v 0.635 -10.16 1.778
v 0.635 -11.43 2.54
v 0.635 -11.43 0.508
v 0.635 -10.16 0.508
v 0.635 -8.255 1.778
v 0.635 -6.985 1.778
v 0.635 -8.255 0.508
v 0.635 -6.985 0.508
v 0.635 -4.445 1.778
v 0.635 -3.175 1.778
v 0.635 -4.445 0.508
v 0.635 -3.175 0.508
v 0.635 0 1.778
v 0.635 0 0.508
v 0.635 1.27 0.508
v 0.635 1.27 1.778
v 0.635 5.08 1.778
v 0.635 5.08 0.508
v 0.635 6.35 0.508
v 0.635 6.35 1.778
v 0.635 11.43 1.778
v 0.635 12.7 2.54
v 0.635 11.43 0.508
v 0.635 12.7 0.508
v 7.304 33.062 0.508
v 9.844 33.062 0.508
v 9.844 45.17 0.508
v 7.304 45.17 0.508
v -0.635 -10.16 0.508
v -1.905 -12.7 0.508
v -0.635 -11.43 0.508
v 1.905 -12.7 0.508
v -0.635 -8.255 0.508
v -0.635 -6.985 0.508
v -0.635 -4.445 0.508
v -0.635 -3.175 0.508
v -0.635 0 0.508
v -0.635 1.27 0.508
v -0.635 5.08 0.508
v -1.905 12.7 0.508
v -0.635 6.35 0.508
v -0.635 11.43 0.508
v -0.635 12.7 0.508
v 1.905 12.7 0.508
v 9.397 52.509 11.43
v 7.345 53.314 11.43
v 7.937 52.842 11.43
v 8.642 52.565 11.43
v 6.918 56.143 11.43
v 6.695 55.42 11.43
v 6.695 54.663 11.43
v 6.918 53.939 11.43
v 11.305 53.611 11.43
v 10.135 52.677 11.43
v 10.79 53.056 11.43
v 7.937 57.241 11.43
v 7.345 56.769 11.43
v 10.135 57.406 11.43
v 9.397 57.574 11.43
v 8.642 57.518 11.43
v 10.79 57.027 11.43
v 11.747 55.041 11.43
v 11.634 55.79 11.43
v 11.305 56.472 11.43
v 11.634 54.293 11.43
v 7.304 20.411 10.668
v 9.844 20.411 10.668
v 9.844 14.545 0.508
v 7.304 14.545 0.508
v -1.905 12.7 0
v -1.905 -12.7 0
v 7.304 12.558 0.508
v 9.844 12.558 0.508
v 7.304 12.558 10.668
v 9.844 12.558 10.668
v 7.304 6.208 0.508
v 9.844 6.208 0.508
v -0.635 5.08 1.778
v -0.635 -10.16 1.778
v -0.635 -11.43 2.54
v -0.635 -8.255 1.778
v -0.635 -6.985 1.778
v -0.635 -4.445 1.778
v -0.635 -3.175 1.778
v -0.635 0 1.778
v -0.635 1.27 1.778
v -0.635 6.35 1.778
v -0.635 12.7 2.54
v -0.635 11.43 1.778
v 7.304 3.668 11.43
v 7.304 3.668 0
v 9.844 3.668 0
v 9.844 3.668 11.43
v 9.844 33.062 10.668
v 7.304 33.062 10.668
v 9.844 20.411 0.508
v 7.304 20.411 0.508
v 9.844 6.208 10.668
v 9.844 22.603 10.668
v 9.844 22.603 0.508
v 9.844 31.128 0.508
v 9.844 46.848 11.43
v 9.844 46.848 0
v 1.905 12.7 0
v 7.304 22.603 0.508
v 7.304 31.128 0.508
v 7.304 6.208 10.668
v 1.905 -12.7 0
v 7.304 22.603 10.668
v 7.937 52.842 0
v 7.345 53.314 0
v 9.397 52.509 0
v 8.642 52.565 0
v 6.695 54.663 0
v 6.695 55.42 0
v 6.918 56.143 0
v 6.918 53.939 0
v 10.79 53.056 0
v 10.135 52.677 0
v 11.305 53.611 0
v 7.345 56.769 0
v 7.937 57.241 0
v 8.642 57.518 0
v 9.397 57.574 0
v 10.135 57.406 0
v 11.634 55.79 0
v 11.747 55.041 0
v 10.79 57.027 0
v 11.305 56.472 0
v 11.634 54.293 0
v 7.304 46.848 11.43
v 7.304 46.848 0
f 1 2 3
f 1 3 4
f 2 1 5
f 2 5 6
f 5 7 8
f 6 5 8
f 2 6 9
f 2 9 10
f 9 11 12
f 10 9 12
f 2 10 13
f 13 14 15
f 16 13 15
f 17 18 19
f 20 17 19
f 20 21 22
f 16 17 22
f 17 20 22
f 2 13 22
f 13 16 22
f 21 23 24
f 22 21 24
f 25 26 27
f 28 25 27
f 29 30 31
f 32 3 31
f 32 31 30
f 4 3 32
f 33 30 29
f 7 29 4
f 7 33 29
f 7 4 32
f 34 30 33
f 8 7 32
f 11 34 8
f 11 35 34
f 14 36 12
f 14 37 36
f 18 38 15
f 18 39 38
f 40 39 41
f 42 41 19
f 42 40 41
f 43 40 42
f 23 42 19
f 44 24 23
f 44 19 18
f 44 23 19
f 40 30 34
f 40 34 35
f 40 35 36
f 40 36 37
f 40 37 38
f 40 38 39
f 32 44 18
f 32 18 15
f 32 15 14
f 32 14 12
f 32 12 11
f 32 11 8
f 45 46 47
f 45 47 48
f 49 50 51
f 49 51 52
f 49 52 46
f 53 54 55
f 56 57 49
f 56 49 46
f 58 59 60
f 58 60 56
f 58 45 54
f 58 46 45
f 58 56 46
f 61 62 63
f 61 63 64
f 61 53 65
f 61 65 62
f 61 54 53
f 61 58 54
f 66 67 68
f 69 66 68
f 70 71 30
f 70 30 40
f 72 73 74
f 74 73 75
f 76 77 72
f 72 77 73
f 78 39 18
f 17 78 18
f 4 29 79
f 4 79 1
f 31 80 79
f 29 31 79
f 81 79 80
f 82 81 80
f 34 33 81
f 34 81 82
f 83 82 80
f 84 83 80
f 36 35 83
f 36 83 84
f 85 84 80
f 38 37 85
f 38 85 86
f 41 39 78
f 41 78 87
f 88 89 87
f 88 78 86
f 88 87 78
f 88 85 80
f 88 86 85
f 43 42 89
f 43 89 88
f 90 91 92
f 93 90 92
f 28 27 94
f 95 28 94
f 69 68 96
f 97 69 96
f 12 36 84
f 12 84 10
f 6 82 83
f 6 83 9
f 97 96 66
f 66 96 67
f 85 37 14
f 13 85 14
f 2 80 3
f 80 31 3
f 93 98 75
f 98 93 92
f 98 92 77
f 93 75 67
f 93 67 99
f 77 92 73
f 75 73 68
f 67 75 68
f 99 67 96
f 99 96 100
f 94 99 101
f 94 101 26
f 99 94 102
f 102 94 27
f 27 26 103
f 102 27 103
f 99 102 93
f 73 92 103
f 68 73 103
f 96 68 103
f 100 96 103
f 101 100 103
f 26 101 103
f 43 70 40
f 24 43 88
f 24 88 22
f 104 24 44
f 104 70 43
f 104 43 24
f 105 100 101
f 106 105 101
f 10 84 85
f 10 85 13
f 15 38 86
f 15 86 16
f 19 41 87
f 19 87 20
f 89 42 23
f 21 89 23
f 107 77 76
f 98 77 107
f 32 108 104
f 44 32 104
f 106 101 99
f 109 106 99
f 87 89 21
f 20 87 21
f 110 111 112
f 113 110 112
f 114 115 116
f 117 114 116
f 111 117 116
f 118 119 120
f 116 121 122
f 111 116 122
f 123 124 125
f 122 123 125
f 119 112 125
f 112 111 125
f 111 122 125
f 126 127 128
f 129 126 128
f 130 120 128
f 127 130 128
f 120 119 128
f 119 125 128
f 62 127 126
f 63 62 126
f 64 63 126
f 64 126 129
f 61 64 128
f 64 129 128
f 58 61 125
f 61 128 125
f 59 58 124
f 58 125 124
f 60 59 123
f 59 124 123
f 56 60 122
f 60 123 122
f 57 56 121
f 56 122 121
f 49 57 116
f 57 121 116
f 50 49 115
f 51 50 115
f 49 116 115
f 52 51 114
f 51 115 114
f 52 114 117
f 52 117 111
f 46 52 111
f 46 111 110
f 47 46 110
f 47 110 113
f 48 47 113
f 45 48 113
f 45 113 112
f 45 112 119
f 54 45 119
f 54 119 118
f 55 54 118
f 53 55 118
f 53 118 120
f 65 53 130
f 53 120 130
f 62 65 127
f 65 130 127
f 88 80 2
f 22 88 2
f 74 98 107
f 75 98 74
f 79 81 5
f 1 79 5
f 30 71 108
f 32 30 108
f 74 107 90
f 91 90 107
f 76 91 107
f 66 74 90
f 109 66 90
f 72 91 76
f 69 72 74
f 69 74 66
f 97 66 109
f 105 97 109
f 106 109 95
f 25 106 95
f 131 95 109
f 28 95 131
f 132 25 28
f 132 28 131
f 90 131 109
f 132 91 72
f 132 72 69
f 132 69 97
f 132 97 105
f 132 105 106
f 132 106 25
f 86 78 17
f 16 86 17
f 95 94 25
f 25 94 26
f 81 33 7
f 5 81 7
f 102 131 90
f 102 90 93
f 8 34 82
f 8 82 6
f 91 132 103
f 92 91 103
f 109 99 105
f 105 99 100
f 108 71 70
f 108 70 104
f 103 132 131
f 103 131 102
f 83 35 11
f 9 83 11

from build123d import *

# Parameters (mm, degrees)
F0_W     = 3.81
F0_H     = 25.4
F1_DEPTH = 0.508
F2_W     = 1.27
F2_H     = 1.27
F3_DEPTH = 1.27
F4_W     = 1.27
F4_H     = 24.13
F5_DEPTH = 0.762
F6_W     = 2.54
F6_H     = 43.18
F6_R     = 2.54
F7_DEPTH = 11.43
F8_W     = 6.35
F8_H     = 10.16
F9_DEPTH = 2.54


with BuildPart() as f1:
    # F0 (on Top) → F1 (new body)
    with BuildSketch(Plane.XY):
        Rectangle(F0_W, F0_H)
    extrude(amount=F1_DEPTH)

    # F2 (on face) → F3 (join)
    with BuildSketch(Plane.XY.offset(0.508)):
        with Locations((0, 12.065)):
            Rectangle(F2_W, F2_H)
        with Locations((0, 5.715)):
            Rectangle(F2_W, F2_H)
        with Locations((0, 0.635)):
            Rectangle(F2_W, F2_H)
        with Locations((0, -3.81)):
            Rectangle(F2_W, F2_H)
        with Locations((0, -7.62)):
            Rectangle(F2_W, F2_H)
        with Locations((0, -10.795)):
            Rectangle(F2_W, F2_H)
    extrude(amount=F3_DEPTH)

    # F4 (on face) → F5 (join)
    with BuildSketch(Plane.XY.offset(1.778)):
        with Locations((0, 0.635)):
            Rectangle(F4_W, F4_H)
    extrude(amount=F5_DEPTH)


with BuildPart() as f7:
    # F6 (on Top) → F7 (new body)
    with BuildSketch(Plane.XY):
        with Locations((8.573812, 25.258003)):
            Rectangle(F6_W, F6_H)
        with Locations((9.206796, 55.041417)):
            Circle(F6_R)
    extrude(amount=F7_DEPTH)

    # F8 (on face) → F9 (cut, through all)
    with BuildSketch(Plane.YZ.offset(9.843812)):
        with Locations((9.383003, 5.588)):
            Rectangle(F8_W, F8_H)
        Polygon((20.411219, 10.668), (14.545341, 0.508), (20.411219, 0.508), align=None)
        Polygon((22.602875, 10.668), (22.602875, 0.508), (31.128127, 0.508), align=None)
        Polygon((33.061758, 10.668), (33.061758, 0.508), (45.169974, 0.508), align=None)
    extrude(amount=-F9_DEPTH, mode=Mode.SUBTRACT)


solid = Compound([f1.part, f7.part])
